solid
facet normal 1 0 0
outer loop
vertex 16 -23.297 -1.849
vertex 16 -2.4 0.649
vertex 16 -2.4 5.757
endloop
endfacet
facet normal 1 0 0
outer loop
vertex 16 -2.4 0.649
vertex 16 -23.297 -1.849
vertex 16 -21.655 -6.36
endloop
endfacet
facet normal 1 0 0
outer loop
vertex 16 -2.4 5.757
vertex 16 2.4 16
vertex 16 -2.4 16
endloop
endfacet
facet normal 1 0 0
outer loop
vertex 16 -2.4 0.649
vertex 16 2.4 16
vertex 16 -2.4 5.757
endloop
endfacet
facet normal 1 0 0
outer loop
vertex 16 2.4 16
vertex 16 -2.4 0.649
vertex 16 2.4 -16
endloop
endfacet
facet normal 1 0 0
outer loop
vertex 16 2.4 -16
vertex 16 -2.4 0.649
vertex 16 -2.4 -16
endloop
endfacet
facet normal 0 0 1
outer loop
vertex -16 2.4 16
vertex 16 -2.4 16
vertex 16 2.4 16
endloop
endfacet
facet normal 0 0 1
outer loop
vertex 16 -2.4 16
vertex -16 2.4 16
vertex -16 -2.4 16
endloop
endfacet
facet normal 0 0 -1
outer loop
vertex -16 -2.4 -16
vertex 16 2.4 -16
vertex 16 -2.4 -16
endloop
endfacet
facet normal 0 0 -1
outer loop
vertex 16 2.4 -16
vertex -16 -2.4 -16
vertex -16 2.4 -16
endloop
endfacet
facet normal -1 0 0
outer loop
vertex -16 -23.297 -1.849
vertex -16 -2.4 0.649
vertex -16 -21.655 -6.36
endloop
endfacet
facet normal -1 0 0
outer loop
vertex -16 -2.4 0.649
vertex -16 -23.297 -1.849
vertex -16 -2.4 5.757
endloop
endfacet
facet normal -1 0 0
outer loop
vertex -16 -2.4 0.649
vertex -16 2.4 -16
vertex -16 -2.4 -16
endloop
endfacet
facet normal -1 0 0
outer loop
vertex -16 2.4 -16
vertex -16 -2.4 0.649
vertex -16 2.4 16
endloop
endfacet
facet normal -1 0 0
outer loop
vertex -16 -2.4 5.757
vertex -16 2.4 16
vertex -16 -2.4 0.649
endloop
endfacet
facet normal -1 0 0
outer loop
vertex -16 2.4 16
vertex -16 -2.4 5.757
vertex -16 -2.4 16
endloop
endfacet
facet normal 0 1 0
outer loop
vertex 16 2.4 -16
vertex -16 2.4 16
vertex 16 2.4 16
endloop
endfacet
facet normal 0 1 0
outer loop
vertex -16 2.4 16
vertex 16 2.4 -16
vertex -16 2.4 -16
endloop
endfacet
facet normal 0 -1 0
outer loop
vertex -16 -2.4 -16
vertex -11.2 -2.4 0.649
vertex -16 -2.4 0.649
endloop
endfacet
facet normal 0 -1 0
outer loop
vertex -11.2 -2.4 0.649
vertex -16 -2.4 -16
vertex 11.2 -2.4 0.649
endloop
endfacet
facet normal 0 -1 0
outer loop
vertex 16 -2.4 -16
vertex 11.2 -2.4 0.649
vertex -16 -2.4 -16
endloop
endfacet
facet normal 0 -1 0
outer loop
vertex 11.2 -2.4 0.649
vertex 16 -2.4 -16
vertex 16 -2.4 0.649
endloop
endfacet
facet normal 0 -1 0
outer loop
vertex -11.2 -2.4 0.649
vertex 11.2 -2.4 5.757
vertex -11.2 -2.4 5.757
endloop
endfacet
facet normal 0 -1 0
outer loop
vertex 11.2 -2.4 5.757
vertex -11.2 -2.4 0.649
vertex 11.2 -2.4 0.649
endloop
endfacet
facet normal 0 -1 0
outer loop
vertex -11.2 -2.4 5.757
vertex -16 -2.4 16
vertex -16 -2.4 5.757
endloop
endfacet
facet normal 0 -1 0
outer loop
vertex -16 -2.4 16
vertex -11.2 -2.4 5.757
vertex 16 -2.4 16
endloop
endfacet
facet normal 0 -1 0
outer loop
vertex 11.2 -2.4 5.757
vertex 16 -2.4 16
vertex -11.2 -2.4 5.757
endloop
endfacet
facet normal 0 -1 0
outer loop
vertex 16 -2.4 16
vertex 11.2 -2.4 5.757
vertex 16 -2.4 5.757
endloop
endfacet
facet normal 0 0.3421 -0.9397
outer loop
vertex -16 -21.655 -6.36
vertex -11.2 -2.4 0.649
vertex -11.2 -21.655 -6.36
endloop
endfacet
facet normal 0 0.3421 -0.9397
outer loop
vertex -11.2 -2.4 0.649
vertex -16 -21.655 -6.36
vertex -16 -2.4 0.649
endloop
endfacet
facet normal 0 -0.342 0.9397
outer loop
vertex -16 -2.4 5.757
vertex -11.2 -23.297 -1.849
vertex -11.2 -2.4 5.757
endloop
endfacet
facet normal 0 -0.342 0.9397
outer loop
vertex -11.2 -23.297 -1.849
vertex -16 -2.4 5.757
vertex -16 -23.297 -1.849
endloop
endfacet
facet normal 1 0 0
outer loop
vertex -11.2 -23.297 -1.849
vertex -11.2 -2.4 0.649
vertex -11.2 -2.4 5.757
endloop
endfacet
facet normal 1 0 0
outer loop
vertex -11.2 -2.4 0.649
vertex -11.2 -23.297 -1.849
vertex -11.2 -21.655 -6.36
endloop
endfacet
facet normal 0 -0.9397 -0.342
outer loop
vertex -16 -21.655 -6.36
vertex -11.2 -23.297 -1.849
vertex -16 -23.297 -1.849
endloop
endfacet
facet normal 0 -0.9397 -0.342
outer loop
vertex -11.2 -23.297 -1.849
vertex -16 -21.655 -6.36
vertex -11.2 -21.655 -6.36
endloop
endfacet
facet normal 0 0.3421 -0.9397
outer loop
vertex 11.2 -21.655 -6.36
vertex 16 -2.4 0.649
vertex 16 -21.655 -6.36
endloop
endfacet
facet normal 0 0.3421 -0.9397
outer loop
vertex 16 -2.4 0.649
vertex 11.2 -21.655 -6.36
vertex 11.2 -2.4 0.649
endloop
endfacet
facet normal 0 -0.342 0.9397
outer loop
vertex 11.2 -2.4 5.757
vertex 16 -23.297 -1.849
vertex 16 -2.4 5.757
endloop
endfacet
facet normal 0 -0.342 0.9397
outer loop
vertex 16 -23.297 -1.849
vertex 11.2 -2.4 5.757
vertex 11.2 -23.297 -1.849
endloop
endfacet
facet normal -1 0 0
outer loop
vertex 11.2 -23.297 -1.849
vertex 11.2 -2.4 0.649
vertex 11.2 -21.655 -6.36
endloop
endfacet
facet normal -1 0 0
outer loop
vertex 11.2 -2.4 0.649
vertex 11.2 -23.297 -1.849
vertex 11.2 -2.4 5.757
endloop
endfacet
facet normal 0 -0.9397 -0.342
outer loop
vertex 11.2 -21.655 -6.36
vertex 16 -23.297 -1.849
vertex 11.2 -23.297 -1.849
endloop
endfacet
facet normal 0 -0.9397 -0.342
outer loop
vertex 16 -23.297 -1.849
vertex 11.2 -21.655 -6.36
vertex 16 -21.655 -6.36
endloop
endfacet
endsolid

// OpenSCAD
size = 32;//block=32 //item=8


cube([size * 1, size * 0.15, size * 1], center = true);//base

translate([-size * 0.425, -size * 0.35, 0]) {
  rotate([20, 0, 0]) {
    cube([size * 0.15, size * 0.75, size * 0.15], center = true);//fork
  }
  ;
}
;//translate


translate([size * 0.425, -size * 0.35, 0]) {
  rotate([20, 0, 0]) {
    cube([size * 0.15, size * 0.75, size * 0.15], center = true);//fork
  }
  ;
}
;//translate
